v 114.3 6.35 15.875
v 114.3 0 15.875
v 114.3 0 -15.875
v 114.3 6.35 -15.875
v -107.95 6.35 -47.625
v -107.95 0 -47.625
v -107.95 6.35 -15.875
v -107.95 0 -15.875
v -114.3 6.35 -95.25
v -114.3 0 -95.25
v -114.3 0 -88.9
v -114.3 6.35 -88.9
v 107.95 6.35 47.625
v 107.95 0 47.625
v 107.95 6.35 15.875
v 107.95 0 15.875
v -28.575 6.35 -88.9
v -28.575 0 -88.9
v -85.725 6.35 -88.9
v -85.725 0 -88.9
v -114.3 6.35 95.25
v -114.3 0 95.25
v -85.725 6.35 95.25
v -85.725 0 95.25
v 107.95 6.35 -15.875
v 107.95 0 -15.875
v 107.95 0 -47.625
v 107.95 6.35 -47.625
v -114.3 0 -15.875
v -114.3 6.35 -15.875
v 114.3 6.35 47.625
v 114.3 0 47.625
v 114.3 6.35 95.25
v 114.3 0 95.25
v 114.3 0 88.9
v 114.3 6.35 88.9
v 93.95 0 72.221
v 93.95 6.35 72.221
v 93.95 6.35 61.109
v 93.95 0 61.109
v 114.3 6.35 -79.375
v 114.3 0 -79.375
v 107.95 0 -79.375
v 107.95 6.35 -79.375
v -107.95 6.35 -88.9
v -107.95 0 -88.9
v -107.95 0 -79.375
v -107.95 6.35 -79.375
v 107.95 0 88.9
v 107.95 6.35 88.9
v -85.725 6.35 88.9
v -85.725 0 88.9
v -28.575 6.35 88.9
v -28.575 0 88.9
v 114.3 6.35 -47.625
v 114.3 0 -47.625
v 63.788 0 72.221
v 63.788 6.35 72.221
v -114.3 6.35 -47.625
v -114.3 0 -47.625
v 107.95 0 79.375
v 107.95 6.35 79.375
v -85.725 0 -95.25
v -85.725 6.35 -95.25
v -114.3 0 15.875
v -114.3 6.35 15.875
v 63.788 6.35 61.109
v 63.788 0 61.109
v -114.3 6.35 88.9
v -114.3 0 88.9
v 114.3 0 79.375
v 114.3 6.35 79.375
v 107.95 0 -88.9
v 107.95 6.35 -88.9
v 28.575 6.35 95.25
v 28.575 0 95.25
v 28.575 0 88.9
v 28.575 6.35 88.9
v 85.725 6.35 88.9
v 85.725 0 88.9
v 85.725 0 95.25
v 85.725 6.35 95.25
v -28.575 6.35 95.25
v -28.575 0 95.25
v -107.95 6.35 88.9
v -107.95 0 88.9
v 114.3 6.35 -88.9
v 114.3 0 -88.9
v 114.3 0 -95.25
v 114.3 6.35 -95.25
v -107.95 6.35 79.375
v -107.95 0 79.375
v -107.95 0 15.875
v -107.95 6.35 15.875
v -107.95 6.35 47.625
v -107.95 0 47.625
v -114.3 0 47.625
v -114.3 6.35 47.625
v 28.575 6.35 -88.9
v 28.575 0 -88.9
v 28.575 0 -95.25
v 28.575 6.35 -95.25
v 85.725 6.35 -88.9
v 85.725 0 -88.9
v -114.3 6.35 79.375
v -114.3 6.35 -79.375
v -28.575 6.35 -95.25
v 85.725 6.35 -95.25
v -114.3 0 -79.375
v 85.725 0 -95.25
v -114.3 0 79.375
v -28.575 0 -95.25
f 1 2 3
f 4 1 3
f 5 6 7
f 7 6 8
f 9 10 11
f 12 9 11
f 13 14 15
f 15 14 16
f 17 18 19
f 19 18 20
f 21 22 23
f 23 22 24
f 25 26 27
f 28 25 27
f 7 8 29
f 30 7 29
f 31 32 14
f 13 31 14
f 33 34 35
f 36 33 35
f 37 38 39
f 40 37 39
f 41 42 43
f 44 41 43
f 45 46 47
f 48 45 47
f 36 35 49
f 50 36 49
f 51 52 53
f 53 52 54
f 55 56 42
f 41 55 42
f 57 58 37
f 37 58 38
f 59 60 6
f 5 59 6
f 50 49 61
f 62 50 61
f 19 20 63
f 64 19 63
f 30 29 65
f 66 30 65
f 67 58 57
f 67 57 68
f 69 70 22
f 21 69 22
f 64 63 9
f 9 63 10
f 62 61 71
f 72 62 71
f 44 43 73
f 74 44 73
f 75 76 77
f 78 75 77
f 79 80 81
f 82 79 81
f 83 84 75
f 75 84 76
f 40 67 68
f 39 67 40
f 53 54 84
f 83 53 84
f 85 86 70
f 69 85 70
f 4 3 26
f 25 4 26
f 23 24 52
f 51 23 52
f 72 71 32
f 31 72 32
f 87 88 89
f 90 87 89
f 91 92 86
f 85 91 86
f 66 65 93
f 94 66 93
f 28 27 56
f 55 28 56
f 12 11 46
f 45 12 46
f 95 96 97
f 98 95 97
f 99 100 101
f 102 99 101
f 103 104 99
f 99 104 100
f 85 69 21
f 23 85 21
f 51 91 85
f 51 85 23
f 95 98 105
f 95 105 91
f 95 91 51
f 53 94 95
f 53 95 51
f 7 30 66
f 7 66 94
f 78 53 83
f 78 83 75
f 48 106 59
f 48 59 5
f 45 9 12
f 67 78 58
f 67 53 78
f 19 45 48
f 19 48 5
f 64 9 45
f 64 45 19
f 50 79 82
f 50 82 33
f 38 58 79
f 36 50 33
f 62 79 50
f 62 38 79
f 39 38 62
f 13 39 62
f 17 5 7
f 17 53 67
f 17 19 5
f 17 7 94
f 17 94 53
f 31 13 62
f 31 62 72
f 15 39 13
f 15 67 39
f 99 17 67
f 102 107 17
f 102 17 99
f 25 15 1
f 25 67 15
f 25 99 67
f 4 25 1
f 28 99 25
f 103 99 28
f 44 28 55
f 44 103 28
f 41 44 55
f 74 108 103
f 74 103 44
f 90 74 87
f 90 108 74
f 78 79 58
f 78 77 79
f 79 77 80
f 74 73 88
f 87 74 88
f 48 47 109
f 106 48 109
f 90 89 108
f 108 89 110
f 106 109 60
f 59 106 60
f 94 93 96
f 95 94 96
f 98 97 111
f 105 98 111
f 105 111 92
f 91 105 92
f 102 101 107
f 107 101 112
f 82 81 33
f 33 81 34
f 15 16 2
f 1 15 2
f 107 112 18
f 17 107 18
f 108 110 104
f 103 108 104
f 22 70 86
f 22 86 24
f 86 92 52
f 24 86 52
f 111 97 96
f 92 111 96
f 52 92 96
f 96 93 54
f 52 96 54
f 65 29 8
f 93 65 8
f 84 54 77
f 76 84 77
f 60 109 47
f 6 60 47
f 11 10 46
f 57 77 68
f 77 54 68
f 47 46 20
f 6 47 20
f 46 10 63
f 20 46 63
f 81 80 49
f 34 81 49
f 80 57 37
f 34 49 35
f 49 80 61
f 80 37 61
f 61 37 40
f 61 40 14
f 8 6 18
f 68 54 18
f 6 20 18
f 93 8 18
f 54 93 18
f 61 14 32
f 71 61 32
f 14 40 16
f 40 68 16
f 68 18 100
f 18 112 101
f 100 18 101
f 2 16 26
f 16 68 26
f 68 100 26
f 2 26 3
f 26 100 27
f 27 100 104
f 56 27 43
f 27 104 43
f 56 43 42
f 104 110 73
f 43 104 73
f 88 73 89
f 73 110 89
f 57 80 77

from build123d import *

# Parameters (mm, degrees)
BOSS_EXTRUDE2_DEPTH = 6.35
SKETCH3_W           = 30.1625
SKETCH3_H           = 11.1125
CUT_EXTRUDE1_DEPTH  = 6.35


with BuildPart() as part:
    # Sketch1 → Boss-Extrude2 (new body)
    with BuildSketch(Plane(origin=(0, 0, 0), x_dir=(1, 0, 0), z_dir=(0, 1, 0))):
        Polygon((114.3, 95.25), (85.725, 95.25), (85.725, 88.9), (28.575, 88.9), (28.575, 95.25), (-28.575, 95.25), (-28.575, 88.9), (-85.725, 88.9), (-85.725, 95.25), (-114.3, 95.25), (-114.3, 88.9), (-107.95, 88.9), (-107.95, 79.375), (-114.3, 79.375), (-114.3, 47.625), (-107.95, 47.625), (-107.95, 15.875), (-114.3, 15.875), (-114.3, -15.875), (-107.95, -15.875), (-107.95, -47.625), (-114.3, -47.625), (-114.3, -79.375), (-107.95, -79.375), (-107.95, -88.9), (-114.3, -88.9), (-114.3, -95.25), (-85.725, -95.25), (-85.725, -88.9), (-28.575, -88.9), (-28.575, -95.25), (28.575, -95.25), (28.575, -88.9), (85.725, -88.9), (85.725, -95.25), (114.3, -95.25), (114.3, -88.9), (107.95, -88.9), (107.95, -79.375), (114.3, -79.375), (114.3, -47.625), (107.95, -47.625), (107.95, -15.875), (114.3, -15.875), (114.3, 15.875), (107.95, 15.875), (107.95, 47.625), (114.3, 47.625), (114.3, 79.375), (107.95, 79.375), (107.95, 88.9), (114.3, 88.9), align=None)
    extrude(amount=BOSS_EXTRUDE2_DEPTH)

    # Sketch3 → Cut-Extrude1 (cut)
    with BuildSketch(Plane(origin=(0, 6.35, 0), x_dir=(1, 0, 0), z_dir=(0, 1, 0))):
        with Locations((78.868959442, -66.665058112)):
            Rectangle(SKETCH3_W, SKETCH3_H)
    extrude(amount=-CUT_EXTRUDE1_DEPTH, mode=Mode.SUBTRACT)


solid = part.part
